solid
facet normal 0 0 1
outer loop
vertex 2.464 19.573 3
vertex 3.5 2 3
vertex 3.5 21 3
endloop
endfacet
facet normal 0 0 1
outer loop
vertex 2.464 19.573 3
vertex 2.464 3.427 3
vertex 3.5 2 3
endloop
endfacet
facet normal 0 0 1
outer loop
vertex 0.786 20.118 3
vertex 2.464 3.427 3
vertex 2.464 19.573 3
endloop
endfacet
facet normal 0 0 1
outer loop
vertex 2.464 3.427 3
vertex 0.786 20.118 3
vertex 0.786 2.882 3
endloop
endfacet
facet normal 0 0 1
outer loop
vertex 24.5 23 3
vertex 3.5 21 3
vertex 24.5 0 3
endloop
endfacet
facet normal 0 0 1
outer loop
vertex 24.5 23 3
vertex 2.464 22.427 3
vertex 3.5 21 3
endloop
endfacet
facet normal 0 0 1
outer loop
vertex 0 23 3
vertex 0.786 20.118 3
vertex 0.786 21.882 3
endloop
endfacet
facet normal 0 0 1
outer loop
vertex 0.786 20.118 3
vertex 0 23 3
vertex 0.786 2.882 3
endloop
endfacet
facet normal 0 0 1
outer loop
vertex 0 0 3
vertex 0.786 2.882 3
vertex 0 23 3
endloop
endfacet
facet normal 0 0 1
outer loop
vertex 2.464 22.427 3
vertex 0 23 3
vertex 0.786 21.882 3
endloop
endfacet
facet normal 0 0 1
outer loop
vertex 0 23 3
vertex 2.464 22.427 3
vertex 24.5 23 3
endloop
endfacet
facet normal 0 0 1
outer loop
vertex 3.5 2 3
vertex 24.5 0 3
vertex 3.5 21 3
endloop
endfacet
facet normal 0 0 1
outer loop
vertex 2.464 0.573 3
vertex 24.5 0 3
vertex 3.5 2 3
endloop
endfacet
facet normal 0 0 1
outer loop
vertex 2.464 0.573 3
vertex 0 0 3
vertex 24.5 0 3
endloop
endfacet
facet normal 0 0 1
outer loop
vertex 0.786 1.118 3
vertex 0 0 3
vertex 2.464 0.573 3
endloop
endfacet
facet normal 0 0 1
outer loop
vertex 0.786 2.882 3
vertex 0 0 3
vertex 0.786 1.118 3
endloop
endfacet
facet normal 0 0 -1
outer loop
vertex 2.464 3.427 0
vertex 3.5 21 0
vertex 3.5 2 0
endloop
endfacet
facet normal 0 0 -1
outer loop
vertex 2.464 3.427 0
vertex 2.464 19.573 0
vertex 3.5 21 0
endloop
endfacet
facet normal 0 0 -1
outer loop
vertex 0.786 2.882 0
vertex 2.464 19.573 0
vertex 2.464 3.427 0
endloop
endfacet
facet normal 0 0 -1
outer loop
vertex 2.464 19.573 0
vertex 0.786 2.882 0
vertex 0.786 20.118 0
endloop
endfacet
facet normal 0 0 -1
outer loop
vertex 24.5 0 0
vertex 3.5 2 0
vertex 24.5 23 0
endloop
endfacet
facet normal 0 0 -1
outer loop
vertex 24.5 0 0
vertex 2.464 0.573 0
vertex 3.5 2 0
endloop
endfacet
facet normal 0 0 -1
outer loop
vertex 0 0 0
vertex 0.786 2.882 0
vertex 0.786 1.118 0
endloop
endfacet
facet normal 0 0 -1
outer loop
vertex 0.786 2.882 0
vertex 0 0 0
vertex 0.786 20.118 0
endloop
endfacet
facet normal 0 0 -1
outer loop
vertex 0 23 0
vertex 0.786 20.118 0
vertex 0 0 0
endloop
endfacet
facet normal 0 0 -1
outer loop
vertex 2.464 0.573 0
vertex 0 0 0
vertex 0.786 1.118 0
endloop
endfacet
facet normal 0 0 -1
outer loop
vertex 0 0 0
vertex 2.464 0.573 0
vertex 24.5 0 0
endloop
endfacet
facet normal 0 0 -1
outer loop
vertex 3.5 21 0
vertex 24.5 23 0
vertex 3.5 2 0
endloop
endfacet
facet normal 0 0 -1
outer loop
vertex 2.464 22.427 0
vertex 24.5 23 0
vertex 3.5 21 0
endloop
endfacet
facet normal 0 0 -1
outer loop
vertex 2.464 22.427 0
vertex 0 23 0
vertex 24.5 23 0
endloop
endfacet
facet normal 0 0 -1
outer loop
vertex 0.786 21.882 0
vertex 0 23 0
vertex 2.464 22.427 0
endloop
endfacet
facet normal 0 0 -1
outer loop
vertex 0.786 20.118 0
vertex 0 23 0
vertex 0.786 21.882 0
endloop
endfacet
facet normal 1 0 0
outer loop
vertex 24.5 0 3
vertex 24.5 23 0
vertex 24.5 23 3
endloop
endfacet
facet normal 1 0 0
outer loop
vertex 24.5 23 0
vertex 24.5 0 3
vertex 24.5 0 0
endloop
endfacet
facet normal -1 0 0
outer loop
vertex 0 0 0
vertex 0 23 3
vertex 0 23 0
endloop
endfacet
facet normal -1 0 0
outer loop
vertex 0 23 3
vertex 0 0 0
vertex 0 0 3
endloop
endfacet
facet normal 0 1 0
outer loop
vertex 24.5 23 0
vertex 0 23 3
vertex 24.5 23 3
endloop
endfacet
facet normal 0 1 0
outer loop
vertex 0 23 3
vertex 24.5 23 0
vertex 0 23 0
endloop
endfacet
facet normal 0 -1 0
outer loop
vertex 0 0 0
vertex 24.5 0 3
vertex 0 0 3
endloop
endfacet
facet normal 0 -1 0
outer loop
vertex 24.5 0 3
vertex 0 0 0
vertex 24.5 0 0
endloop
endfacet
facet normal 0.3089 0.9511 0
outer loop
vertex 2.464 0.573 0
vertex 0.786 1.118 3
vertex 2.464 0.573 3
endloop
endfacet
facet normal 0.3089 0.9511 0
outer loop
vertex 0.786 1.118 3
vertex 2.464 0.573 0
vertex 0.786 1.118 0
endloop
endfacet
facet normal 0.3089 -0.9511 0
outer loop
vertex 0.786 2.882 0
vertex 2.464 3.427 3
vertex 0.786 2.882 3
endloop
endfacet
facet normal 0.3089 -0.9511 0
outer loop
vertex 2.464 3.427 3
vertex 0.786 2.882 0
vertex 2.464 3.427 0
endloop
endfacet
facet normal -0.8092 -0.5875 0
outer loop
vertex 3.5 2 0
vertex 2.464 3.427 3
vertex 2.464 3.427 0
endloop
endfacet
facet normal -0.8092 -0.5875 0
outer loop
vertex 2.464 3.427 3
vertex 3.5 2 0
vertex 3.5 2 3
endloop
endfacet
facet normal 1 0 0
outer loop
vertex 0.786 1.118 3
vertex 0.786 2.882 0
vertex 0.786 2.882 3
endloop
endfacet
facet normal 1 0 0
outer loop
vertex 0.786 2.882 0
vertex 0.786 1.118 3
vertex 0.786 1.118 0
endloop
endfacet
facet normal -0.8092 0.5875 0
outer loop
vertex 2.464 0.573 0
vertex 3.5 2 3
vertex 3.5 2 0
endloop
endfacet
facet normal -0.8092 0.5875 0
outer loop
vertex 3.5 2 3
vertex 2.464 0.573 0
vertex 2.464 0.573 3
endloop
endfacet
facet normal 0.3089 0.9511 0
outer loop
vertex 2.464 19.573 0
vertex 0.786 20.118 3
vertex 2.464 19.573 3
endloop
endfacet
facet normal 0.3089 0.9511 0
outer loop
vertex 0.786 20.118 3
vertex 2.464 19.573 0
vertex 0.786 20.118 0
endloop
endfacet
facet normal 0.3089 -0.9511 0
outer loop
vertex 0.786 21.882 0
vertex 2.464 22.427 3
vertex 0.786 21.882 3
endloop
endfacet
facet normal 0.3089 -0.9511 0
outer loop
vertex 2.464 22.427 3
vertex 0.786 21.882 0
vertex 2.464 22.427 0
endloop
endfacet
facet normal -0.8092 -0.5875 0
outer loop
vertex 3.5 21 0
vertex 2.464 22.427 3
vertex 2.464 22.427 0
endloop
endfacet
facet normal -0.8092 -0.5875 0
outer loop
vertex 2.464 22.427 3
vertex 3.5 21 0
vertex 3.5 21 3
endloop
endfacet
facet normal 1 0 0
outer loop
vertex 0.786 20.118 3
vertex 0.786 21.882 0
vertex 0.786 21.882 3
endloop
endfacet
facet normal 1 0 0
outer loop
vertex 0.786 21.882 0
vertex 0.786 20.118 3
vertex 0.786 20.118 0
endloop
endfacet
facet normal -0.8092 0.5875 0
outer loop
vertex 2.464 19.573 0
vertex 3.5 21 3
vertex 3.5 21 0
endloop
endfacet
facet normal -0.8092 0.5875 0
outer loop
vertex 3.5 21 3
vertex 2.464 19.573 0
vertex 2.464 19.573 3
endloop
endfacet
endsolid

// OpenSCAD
module df_player_pro(){
    
    LENGTH = 24.5;
    WIDTH = 23;
    DEPTH = 3;
    MOUNTING_PAD_DIAMETER = 4;
    MOUNTING_HOLE_DIAMETER = 3;
    
    difference(){
        
        union(){
            cube([LENGTH,WIDTH,DEPTH]);
            
            color("green"){
                translate([MOUNTING_PAD_DIAMETER/2,(WIDTH-19)/2,0]){
                    cylinder(r=MOUNTING_PAD_DIAMETER/2,h=DEPTH);
                }
                
                translate([MOUNTING_PAD_DIAMETER/2,WIDTH-((WIDTH-19)/2),0]){
                    cylinder(r=MOUNTING_PAD_DIAMETER/2,h=DEPTH);
                }
            }
        }
        
        // mounting holes
        translate([MOUNTING_PAD_DIAMETER/2,(WIDTH-19)/2,-1]){
            cylinder(r=MOUNTING_HOLE_DIAMETER/2,h=DEPTH+2);
        }
        
        translate([MOUNTING_PAD_DIAMETER/2,WIDTH-((WIDTH-19)/2),-1]){
            cylinder(r=MOUNTING_HOLE_DIAMETER/2,h=DEPTH+2);
        }
    }
}

df_player_pro();
